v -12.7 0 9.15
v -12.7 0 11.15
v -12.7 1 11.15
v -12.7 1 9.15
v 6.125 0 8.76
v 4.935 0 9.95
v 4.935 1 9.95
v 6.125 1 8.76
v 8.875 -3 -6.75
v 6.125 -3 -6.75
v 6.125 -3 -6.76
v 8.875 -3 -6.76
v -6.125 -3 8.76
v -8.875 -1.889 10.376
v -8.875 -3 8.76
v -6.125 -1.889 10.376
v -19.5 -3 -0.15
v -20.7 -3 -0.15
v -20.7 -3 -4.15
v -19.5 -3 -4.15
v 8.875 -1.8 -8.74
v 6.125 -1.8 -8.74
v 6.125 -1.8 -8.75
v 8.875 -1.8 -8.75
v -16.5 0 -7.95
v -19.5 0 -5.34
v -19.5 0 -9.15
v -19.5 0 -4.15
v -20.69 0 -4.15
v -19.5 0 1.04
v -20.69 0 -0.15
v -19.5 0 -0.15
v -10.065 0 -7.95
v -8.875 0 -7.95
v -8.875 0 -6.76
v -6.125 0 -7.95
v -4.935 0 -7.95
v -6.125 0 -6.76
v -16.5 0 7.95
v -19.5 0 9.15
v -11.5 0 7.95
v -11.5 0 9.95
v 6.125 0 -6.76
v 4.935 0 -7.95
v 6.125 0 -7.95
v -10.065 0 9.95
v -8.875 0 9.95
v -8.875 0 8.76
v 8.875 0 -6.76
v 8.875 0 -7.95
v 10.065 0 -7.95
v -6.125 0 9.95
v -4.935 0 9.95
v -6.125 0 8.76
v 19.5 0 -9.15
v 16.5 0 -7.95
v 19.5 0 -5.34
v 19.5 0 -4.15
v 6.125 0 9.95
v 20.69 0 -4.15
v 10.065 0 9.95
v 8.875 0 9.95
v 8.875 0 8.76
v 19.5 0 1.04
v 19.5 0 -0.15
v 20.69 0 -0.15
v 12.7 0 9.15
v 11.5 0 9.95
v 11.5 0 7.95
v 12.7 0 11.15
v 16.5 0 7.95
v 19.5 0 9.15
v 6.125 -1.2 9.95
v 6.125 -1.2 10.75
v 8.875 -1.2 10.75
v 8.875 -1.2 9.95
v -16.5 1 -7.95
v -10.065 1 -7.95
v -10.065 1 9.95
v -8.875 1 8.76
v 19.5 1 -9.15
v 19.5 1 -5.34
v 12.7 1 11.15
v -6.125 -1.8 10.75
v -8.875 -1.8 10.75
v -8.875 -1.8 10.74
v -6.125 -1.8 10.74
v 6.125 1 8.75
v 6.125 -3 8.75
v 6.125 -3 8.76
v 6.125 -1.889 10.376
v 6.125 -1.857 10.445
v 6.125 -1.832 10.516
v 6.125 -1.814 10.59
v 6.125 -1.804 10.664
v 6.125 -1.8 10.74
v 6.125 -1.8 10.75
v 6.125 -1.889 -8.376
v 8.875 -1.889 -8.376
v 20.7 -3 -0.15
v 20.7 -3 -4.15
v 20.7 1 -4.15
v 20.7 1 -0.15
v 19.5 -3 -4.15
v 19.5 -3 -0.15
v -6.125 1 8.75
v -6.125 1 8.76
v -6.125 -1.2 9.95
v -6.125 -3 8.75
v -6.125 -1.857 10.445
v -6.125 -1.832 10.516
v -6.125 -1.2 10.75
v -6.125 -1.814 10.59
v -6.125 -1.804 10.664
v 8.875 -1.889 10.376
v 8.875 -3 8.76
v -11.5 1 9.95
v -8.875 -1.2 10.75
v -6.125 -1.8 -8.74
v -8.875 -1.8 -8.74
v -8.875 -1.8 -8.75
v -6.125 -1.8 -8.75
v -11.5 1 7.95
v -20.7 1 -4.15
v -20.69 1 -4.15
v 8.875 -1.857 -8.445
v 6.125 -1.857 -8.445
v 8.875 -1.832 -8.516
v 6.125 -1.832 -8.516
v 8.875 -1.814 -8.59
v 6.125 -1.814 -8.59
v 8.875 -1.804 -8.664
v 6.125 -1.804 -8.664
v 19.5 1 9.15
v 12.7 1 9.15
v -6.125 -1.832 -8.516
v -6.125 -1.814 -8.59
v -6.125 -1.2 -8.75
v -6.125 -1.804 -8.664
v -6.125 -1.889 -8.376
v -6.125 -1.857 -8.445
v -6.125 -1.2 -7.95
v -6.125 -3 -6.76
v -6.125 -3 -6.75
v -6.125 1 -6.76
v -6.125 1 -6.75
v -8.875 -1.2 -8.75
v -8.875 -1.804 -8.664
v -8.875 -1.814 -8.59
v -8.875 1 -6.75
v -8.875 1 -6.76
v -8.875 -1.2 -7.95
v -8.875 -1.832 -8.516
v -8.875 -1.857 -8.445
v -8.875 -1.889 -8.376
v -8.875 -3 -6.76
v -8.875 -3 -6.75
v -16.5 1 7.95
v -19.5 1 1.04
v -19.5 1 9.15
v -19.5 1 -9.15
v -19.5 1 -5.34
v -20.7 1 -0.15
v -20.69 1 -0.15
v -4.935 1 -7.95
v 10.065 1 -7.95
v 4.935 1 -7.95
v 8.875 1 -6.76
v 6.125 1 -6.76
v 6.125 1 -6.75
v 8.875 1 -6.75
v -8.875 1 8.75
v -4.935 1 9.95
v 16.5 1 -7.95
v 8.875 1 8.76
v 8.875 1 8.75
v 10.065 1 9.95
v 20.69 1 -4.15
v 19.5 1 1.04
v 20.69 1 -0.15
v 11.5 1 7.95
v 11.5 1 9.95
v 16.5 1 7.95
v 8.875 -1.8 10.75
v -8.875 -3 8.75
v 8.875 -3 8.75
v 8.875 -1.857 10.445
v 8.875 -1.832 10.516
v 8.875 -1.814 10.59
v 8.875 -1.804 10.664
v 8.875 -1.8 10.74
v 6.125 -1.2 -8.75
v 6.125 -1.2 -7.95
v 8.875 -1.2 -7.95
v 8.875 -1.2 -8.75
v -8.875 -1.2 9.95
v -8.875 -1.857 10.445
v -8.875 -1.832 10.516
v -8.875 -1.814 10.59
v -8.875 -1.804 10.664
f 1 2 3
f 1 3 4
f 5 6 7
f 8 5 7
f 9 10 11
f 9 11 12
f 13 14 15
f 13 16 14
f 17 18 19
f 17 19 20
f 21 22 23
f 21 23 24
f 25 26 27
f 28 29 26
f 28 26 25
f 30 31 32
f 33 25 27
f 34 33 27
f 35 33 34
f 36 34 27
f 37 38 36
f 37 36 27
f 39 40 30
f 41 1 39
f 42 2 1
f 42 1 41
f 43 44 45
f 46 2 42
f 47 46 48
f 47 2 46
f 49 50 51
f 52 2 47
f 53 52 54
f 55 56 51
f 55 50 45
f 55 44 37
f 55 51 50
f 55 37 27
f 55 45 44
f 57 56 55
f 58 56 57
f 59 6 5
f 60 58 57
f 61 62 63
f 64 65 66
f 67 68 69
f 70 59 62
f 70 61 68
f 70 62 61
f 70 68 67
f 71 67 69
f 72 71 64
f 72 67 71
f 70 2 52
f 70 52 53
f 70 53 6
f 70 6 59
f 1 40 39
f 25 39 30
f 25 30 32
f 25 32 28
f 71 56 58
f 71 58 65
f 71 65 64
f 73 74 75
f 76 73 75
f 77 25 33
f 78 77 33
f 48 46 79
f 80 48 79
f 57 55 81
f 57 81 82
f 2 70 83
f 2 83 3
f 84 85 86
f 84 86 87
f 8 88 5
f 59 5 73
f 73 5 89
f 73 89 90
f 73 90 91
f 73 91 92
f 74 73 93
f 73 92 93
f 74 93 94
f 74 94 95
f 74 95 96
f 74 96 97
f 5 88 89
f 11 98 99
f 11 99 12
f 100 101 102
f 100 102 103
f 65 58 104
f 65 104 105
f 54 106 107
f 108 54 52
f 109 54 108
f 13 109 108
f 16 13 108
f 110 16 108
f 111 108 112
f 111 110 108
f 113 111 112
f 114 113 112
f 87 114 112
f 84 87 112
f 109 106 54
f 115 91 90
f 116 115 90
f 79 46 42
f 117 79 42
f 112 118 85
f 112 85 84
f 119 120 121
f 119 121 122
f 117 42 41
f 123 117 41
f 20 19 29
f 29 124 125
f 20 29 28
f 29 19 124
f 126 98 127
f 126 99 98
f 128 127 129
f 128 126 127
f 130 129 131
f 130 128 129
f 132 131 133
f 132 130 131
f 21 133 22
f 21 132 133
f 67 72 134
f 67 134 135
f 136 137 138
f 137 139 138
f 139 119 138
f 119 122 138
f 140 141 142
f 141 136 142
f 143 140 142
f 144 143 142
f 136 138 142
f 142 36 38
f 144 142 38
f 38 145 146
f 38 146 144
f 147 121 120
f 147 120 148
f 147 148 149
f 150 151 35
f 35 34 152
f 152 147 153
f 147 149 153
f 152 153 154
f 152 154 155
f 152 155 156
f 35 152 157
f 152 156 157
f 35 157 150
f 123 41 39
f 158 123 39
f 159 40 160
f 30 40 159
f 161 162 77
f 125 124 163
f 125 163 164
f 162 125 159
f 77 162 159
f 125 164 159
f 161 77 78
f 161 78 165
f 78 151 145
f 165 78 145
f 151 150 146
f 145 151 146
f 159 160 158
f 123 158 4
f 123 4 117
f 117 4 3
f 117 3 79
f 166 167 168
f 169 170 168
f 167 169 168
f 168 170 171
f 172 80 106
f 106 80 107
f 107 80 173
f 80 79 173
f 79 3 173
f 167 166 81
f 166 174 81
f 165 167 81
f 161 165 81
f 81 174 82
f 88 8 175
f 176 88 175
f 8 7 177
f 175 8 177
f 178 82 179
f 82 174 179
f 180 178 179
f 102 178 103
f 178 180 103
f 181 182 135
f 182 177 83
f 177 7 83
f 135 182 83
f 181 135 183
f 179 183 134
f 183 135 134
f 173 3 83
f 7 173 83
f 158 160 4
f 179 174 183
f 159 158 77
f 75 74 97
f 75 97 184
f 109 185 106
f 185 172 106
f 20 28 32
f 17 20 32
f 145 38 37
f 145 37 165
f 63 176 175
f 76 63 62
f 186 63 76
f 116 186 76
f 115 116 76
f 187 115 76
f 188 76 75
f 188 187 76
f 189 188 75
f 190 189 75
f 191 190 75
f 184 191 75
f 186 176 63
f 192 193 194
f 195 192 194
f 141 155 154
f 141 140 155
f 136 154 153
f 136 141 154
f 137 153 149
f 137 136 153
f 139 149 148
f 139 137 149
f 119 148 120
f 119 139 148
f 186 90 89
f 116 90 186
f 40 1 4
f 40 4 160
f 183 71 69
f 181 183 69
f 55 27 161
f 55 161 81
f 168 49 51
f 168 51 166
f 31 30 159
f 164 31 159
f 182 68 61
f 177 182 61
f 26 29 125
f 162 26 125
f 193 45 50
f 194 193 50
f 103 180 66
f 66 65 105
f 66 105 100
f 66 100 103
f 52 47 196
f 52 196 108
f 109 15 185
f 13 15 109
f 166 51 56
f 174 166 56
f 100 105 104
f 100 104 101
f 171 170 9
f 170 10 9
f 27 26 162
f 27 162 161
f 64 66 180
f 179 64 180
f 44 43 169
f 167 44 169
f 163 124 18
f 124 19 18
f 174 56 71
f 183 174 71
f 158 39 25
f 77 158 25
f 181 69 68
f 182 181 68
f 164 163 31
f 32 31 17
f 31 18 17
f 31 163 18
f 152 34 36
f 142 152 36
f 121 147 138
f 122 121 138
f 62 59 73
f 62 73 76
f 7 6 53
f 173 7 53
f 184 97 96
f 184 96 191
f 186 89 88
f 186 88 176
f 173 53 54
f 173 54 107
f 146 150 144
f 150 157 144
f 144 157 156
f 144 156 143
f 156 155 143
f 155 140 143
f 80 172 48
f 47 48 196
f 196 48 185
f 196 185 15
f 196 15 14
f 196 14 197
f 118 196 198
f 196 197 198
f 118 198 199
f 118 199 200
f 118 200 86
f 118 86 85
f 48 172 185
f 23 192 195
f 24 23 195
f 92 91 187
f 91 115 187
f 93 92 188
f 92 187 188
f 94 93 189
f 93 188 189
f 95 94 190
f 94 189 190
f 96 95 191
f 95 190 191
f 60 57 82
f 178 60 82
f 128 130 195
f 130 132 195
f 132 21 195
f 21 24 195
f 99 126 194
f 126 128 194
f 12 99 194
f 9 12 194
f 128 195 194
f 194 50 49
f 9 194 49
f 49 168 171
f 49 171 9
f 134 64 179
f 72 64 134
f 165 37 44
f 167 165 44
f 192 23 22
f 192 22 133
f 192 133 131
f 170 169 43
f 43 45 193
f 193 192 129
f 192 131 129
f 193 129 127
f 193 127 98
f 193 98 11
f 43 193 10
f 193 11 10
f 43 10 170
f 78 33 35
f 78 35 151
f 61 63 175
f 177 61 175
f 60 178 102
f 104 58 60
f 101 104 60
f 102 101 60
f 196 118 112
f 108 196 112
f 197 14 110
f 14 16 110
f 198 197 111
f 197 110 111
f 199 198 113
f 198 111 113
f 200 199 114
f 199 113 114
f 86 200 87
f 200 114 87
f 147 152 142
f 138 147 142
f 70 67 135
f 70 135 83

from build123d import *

# Parameters (mm, degrees)
PAD_DEPTH         = 1
SKETCH001_W       = 2.75
SKETCH001_H       = 1.2
PAD001_DEPTH      = 3
PAD001_DEPTH_BACK = 1
CHAMFER_SIZE      = 1.19
SKETCH002_W       = 2.75
SKETCH002_H       = 2
PAD002_DEPTH      = 0.6
FILLET_R          = 0.79
CHAMFER001_SIZE   = 1.19
SKETCH003_W       = 1.2
SKETCH003_H       = 4
PAD003_DEPTH      = 3
PAD003_DEPTH_BACK = 1
CHAMFER002_SIZE   = 1.19


with BuildPart() as part:
    # Sketch → Pad (new body)
    with BuildSketch(Plane.XZ):
        Polygon((-19.5, -9.15), (19.5, -9.15), (19.5, 9.15), (12.7, 9.15), (12.7, 11.15), (-12.7, 11.15), (-12.7, 9.15), (-19.5, 9.15), align=None)
        Polygon((-16.5, -7.95), (16.5, -7.95), (16.5, 7.95), (11.5, 7.95), (11.5, 9.95), (-11.5, 9.95), (-11.5, 7.95), (-16.5, 7.95), align=None, mode=Mode.SUBTRACT)
    extrude(amount=-PAD_DEPTH)

    # Sketch001 → Pad001 (join, two sides)
    with BuildSketch(Plane.XZ) as pad001_sk:
        with Locations((-7.5, 9.35)):
            Rectangle(SKETCH001_W, SKETCH001_H)
        with Locations((7.5, 9.35)):
            Rectangle(SKETCH001_W, SKETCH001_H)
        with Locations((-7.5, -7.35)):
            Rectangle(SKETCH001_W, SKETCH001_H)
        with Locations((7.5, -7.35)):
            Rectangle(SKETCH001_W, SKETCH001_H)
    extrude(amount=PAD001_DEPTH)
    extrude(pad001_sk.sketch, amount=-PAD001_DEPTH_BACK)

    # Chamfer
    chamfer_edges = [part.edges().sort_by_distance(p)[0] for p in [
        (-6.125, 0.5, -7.95),
        (-8.875, 0.5, -7.95),
        (6.125, 0.5, -7.95),
        (8.875, 0.5, -7.95),
        (8.875, 0.5, 9.95),
        (6.125, 0.5, 9.95),
        (-6.125, 0.5, 9.95),
        (-8.875, 0.5, 9.95),
    ]]
    chamfer(chamfer_edges, length=CHAMFER_SIZE)

    # Sketch002 (on DatumPlane) → Pad002 (join)
    with BuildSketch(Plane.XZ.offset(1.2)):
        with Locations((-7.5, 9.75)):
            Rectangle(SKETCH002_W, SKETCH002_H)
        with Locations((7.5, 9.75)):
            Rectangle(SKETCH002_W, SKETCH002_H)
        with Locations((7.5, -7.75)):
            Rectangle(SKETCH002_W, SKETCH002_H)
        with Locations((-7.5, -7.75)):
            Rectangle(SKETCH002_W, SKETCH002_H)
    extrude(amount=PAD002_DEPTH)

    # Fillet
    fillet_edges = [part.edges().sort_by_distance(p)[0] for p in [
        (7.5, -1.8, 9.95),
        (-7.5, -1.8, 9.95),
        (-7.5, -1.8, -7.95),
        (7.5, -1.8, -7.95),
    ]]
    fillet(fillet_edges, radius=FILLET_R)

    # Chamfer001
    chamfer001_edges = [part.edges().sort_by_distance(p)[0] for p in [
        (7.5, -3, 9.95),
        (-7.5, -3, 9.95),
        (-7.5, -3, -7.95),
        (7.5, -3, -7.95),
    ]]
    chamfer(chamfer001_edges, length=CHAMFER001_SIZE)

    # Sketch003 → Pad003 (join, two sides)
    with BuildSketch(Plane.XZ) as pad003_sk:
        with Locations((20.1, -2.15)):
            Rectangle(SKETCH003_W, SKETCH003_H)
        with Locations((-20.1, -2.15)):
            Rectangle(SKETCH003_W, SKETCH003_H)
    extrude(amount=PAD003_DEPTH)
    extrude(pad003_sk.sketch, amount=-PAD003_DEPTH_BACK)

    # Chamfer002
    chamfer002_edges = [part.edges().sort_by_distance(p)[0] for p in [
        (-19.5, 0.5, -4.15),
        (-19.5, 0.5, -0.15),
        (19.5, 0.5, -4.15),
        (19.5, 0.5, -0.15),
    ]]
    chamfer(chamfer002_edges, length=CHAMFER002_SIZE)


solid = part.part
